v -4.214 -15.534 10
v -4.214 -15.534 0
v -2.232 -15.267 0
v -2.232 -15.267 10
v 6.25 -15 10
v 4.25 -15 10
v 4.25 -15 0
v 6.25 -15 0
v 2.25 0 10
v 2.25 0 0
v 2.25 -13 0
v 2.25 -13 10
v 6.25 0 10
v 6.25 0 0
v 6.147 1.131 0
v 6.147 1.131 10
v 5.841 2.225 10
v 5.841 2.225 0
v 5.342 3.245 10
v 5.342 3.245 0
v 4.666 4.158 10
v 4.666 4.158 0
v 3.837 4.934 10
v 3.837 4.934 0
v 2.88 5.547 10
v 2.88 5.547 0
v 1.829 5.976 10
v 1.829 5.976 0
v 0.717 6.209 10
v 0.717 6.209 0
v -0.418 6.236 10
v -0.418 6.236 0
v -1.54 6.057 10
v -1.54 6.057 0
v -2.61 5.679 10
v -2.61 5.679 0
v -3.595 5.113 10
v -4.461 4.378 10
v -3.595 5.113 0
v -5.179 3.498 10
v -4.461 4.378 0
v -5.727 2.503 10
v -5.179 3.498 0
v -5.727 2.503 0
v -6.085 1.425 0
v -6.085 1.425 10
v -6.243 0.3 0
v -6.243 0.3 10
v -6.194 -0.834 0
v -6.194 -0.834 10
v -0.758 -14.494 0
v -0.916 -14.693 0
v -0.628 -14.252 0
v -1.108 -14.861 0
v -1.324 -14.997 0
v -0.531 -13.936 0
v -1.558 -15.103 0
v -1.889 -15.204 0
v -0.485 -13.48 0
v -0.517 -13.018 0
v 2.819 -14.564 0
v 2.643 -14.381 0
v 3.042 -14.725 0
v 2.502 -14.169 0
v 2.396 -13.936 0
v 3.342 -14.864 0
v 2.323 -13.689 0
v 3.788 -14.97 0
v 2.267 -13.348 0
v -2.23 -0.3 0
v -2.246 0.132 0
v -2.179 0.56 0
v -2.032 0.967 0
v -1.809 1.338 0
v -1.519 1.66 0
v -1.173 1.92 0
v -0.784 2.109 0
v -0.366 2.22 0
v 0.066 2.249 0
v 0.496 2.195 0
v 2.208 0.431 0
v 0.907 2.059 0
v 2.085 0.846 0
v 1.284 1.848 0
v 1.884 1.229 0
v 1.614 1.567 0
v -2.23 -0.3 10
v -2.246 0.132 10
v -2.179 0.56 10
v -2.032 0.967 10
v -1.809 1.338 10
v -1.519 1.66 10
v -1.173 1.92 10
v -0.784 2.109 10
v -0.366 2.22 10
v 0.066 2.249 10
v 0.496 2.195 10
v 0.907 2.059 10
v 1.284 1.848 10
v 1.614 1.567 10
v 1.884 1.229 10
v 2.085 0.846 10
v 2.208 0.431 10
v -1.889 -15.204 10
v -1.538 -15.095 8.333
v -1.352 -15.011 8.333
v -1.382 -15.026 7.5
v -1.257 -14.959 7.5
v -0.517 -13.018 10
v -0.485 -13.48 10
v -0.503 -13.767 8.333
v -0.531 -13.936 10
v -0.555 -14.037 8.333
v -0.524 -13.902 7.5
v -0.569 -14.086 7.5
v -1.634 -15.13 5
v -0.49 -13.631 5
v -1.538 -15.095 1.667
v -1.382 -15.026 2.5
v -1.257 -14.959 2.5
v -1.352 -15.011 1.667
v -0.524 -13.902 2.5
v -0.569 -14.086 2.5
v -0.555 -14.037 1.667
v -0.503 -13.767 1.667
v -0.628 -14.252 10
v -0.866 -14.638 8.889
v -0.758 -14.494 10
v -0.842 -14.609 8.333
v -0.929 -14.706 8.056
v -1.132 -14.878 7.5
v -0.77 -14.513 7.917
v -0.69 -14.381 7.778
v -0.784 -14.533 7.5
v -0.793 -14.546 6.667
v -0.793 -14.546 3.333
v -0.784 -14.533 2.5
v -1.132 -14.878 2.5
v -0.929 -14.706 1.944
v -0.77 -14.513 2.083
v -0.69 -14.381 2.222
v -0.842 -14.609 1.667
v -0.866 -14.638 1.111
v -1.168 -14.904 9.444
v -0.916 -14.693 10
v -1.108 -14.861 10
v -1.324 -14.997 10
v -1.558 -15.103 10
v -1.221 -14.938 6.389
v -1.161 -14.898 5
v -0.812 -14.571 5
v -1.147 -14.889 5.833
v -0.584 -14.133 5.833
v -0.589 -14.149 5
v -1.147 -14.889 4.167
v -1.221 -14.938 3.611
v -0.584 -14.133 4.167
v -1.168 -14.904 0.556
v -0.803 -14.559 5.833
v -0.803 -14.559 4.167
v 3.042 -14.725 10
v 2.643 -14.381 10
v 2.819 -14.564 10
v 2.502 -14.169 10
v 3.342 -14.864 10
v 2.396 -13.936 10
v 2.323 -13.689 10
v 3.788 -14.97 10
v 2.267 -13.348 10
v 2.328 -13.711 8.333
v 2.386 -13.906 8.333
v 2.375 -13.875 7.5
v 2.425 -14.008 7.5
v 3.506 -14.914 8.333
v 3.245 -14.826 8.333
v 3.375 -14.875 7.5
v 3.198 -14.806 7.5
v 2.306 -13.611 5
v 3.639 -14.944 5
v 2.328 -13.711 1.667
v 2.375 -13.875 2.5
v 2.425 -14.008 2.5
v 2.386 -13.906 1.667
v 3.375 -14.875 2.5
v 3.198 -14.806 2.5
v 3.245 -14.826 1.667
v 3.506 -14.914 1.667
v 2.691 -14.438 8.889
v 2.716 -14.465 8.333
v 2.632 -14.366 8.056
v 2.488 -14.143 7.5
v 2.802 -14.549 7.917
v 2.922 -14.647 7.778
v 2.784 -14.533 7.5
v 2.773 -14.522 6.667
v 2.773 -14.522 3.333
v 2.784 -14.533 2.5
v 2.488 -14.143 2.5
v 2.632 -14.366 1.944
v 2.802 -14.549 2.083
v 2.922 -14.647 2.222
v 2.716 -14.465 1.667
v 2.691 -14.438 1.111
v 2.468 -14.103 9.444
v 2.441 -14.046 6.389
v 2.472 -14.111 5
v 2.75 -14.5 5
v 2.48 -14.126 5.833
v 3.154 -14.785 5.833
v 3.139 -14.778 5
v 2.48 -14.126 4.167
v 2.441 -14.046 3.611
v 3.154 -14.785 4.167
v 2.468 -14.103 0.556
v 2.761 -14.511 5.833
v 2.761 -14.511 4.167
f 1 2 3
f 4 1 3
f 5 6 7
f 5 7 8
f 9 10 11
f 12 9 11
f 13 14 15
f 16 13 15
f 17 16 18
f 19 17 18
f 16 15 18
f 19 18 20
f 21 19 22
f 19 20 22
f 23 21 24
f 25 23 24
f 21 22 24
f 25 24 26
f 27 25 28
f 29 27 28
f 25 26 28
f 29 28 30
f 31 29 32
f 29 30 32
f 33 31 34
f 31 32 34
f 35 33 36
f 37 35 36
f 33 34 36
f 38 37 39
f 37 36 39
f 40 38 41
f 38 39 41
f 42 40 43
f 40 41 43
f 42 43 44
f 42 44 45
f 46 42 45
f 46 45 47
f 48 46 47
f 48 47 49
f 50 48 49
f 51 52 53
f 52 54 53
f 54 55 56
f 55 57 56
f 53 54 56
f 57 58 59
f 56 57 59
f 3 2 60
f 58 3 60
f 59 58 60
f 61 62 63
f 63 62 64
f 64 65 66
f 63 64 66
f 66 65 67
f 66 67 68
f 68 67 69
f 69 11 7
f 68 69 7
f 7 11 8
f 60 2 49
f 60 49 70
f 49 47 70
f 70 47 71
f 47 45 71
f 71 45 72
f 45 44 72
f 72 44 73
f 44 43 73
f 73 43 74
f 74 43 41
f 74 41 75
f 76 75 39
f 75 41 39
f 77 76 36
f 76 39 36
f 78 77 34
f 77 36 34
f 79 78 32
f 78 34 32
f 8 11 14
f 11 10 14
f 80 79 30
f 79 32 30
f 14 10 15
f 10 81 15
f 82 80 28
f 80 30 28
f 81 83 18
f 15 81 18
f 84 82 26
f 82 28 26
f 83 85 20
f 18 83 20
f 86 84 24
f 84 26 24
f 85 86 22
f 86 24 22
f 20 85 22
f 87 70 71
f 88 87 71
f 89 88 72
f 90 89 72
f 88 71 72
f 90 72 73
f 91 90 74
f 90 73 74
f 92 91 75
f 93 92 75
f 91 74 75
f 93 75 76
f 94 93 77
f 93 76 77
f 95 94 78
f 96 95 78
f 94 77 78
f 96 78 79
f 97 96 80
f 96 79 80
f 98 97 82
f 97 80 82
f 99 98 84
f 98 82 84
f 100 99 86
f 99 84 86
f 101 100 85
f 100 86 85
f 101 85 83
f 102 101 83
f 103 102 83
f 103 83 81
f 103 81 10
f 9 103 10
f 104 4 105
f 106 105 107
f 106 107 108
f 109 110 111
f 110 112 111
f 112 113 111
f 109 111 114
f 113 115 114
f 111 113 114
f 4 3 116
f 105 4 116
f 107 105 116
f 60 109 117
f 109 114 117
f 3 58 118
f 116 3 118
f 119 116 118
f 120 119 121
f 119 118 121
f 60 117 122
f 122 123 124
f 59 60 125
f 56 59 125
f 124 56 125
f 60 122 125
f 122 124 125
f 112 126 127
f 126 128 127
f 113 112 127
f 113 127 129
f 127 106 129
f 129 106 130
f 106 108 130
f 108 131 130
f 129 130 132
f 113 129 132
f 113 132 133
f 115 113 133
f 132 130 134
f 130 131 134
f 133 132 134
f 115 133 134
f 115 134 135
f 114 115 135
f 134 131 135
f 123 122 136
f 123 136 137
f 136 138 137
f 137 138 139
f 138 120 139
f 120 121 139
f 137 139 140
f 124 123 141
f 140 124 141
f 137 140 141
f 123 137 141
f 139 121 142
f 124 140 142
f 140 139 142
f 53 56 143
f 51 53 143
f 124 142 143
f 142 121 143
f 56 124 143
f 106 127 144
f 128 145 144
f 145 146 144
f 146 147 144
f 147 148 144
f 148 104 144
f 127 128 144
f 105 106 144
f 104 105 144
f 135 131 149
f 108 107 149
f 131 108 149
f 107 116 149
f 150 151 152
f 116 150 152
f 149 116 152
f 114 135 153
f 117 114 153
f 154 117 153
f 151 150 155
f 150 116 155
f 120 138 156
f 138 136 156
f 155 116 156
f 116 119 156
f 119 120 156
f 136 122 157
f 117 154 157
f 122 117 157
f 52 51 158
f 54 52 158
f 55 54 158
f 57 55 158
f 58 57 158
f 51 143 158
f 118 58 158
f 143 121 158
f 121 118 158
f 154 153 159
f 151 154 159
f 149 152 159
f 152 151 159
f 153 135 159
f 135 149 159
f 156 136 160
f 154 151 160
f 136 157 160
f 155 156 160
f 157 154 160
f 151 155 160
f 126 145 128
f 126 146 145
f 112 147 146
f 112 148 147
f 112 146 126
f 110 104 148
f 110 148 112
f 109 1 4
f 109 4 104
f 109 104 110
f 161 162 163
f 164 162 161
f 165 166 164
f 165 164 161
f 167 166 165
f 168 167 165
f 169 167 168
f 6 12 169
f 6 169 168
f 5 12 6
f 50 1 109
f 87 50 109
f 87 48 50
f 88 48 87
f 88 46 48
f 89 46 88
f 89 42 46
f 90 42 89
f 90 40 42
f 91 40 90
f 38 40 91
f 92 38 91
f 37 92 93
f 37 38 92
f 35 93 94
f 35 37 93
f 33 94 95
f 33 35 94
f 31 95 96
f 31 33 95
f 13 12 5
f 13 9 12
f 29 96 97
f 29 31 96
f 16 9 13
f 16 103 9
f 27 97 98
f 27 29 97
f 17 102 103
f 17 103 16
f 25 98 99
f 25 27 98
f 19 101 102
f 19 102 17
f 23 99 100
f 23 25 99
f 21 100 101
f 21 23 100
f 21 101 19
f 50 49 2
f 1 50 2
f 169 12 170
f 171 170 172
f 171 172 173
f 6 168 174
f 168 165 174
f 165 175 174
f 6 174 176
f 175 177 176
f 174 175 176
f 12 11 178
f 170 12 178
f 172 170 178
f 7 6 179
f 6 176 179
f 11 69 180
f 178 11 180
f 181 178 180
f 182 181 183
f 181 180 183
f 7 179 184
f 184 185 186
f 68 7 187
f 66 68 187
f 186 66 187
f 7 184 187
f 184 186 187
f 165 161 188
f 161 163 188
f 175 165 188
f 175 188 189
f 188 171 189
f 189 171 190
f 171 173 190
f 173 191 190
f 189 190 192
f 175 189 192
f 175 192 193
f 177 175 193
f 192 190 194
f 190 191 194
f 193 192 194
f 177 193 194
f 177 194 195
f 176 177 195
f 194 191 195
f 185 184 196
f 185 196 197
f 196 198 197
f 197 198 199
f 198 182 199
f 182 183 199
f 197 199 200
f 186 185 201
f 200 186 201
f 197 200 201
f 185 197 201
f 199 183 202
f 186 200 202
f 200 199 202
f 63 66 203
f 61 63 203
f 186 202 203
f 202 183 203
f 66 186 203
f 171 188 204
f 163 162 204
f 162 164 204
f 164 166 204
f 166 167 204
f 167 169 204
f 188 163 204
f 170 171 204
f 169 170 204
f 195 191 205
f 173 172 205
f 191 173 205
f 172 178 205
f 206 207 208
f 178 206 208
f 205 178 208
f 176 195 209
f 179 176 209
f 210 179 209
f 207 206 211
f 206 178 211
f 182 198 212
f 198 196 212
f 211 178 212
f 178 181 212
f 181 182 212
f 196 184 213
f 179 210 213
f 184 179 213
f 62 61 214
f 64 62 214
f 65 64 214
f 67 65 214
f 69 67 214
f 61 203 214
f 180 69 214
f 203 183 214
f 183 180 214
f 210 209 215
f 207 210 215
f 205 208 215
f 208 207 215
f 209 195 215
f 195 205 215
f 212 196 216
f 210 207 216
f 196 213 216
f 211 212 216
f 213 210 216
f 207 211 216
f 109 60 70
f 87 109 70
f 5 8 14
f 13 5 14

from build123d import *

# Parameters (mm, degrees)
F1_DEPTH    = 10
F2_T1_DEPTH = 20


# Not quite as in the source:
# - a fillet or chamfer that OpenCascade refuses, or shapes differently, is made with other operations: its cross-section is extruded or revolved along the edge and cut away or added


with BuildPart() as f1:
    # F0 (on Top) → F1 (new body)
    with BuildSketch(Plane.XY):
        with BuildLine():
            ThreePointArc((-2.2298651391, -0.300335581), (-0.1505048785, 2.2449606414), (2.25, 0))
            Line((2.25, 0), (2.25, -15))
            Line((2.25, -15), (6.25, -15))
            Line((6.25, -15), (6.25, 0))
            ThreePointArc((6.25, 0), (-0.418069107, 6.2360017817), (-6.194069831, -0.8342655028))
            Line((-6.194069831, -0.8342655028), (-4.2142046918, -15.5339299218))
            Line((-4.2142046918, -15.5339299218), (-0.25, -15))
            Line((-0.25, -15), (-2.2298651391, -0.300335581))
        make_face()
    extrude(amount=F1_DEPTH)

    # F2: fillet of radius 2 on 2 edges, made by hand

    # F2_s2 → F2_t1 (cut)
    with BuildSketch(Plane.XY.offset(-5)):
        with BuildLine():
            add(Edge.make_bspline(
                [(-2.2321023459, -15.2669649609), (-0.25, -15), (-0.5169649609, -13.0178976541)],
                knots=[0, 0, 0, 1, 1, 1], degree=2, weights=[1, 1, 1]))
            Line((-0.5169649609, -13.0178976541), (-0.25, -15))
            Line((-0.25, -15), (-2.2321023459, -15.2669649609))
        make_face()
        with BuildLine():
            add(Edge.make_bspline(
                [(2.25, -13), (2.25, -15), (4.25, -15)],
                knots=[0, 0, 0, 1, 1, 1], degree=2, weights=[1, 1, 1]))
            Line((4.25, -15), (2.25, -15))
            Line((2.25, -15), (2.25, -13))
        make_face()
    extrude(amount=F2_T1_DEPTH, mode=Mode.SUBTRACT)


solid = f1.part
